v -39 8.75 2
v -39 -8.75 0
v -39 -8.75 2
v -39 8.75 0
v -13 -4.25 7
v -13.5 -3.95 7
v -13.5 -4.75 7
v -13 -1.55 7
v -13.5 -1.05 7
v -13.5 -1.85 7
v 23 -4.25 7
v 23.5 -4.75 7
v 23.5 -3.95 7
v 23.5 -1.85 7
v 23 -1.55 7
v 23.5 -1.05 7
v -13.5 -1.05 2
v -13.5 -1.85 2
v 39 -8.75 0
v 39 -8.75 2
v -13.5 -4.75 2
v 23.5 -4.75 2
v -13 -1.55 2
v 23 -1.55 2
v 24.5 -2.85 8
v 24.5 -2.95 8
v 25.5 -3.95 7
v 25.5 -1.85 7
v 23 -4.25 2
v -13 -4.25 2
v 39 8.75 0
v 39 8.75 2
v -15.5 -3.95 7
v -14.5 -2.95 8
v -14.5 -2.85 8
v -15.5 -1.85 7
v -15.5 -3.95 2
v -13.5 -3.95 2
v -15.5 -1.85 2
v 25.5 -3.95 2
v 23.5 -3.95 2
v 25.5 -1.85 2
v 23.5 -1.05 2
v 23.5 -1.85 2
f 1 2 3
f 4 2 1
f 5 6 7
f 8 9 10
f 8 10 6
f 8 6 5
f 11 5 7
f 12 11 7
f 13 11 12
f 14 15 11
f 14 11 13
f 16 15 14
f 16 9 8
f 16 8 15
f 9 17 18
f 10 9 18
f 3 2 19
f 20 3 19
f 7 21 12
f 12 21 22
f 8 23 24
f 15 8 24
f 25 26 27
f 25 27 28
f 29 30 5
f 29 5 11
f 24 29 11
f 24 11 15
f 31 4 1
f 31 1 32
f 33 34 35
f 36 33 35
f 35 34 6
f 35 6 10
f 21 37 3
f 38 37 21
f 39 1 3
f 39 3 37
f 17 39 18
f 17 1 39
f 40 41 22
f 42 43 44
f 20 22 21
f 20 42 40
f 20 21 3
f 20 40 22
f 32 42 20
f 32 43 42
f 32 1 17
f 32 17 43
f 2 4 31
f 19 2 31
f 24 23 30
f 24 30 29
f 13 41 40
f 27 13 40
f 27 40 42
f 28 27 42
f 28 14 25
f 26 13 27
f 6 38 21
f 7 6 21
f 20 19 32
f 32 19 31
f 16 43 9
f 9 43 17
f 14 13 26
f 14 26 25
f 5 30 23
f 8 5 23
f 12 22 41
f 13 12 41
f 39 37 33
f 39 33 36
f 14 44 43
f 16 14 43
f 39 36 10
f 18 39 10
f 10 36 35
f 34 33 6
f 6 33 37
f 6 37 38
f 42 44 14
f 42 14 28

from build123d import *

# Parameters (mm, degrees)
F0_W     = 78
F0_H     = 17.5
F1_DEPTH = 2
F2_W     = 36
F2_H     = 2.7
F2_W_2   = 2
F2_H_2   = 2.1
F3_DEPTH = 5
F4_W     = 2
F4_H     = 2.1
F5_DEPTH = 1
F6_SIZE  = 0.99999


# Not quite as in the source:
# - a fillet or chamfer is up to 0.001 mm smaller than in the source, because OpenCascade refuses the exact size


with BuildPart() as f1:
    # F0 (on Top) → F1 (new body)
    with BuildSketch(Plane.XY):
        Rectangle(F0_W, F0_H)
    extrude(amount=F1_DEPTH)

    # F2 (on face) → F3 (join)
    with BuildSketch(Plane.XY.offset(2)):
        Polygon((-13.5, -3.95), (-13.5, -4.75), (23.5, -4.75), (23.5, -3.95), (23.5, -1.85), (23.5, -1.05), (-13.5, -1.05), (-13.5, -1.85), align=None)
        with Locations((5, -2.9)):
            Rectangle(F2_W, F2_H, mode=Mode.SUBTRACT)
        with Locations((-14.5, -2.9)):
            Rectangle(F2_W_2, F2_H_2)
        with Locations((24.5, -2.9)):
            Rectangle(F2_W_2, F2_H_2)
    extrude(amount=F3_DEPTH)

    # F4 (on face) → F5 (join)
    with BuildSketch(Plane.XY.offset(7)):
        with Locations((-14.5, -2.9)):
            Rectangle(F4_W, F4_H)
        with Locations((24.5, -2.9)):
            Rectangle(F4_W, F4_H)
    extrude(amount=F5_DEPTH)

    # F6 (size 1 in the source; OpenCascade refuses exactly that, so slightly less here)
    f6_edges = [f1.edges().sort_by_distance(p)[0] for p in [
        (-15.5, -2.9, 8),
        (-14.5, -1.85, 8),
        (-13.5, -2.9, 8),
        (-14.5, -3.95, 8),
        (24.5, -1.85, 8),
        (23.5, -2.9, 8),
        (25.5, -2.9, 8),
        (24.5, -3.95, 8),
    ]]
    chamfer(f6_edges, length=F6_SIZE)


solid = f1.part
